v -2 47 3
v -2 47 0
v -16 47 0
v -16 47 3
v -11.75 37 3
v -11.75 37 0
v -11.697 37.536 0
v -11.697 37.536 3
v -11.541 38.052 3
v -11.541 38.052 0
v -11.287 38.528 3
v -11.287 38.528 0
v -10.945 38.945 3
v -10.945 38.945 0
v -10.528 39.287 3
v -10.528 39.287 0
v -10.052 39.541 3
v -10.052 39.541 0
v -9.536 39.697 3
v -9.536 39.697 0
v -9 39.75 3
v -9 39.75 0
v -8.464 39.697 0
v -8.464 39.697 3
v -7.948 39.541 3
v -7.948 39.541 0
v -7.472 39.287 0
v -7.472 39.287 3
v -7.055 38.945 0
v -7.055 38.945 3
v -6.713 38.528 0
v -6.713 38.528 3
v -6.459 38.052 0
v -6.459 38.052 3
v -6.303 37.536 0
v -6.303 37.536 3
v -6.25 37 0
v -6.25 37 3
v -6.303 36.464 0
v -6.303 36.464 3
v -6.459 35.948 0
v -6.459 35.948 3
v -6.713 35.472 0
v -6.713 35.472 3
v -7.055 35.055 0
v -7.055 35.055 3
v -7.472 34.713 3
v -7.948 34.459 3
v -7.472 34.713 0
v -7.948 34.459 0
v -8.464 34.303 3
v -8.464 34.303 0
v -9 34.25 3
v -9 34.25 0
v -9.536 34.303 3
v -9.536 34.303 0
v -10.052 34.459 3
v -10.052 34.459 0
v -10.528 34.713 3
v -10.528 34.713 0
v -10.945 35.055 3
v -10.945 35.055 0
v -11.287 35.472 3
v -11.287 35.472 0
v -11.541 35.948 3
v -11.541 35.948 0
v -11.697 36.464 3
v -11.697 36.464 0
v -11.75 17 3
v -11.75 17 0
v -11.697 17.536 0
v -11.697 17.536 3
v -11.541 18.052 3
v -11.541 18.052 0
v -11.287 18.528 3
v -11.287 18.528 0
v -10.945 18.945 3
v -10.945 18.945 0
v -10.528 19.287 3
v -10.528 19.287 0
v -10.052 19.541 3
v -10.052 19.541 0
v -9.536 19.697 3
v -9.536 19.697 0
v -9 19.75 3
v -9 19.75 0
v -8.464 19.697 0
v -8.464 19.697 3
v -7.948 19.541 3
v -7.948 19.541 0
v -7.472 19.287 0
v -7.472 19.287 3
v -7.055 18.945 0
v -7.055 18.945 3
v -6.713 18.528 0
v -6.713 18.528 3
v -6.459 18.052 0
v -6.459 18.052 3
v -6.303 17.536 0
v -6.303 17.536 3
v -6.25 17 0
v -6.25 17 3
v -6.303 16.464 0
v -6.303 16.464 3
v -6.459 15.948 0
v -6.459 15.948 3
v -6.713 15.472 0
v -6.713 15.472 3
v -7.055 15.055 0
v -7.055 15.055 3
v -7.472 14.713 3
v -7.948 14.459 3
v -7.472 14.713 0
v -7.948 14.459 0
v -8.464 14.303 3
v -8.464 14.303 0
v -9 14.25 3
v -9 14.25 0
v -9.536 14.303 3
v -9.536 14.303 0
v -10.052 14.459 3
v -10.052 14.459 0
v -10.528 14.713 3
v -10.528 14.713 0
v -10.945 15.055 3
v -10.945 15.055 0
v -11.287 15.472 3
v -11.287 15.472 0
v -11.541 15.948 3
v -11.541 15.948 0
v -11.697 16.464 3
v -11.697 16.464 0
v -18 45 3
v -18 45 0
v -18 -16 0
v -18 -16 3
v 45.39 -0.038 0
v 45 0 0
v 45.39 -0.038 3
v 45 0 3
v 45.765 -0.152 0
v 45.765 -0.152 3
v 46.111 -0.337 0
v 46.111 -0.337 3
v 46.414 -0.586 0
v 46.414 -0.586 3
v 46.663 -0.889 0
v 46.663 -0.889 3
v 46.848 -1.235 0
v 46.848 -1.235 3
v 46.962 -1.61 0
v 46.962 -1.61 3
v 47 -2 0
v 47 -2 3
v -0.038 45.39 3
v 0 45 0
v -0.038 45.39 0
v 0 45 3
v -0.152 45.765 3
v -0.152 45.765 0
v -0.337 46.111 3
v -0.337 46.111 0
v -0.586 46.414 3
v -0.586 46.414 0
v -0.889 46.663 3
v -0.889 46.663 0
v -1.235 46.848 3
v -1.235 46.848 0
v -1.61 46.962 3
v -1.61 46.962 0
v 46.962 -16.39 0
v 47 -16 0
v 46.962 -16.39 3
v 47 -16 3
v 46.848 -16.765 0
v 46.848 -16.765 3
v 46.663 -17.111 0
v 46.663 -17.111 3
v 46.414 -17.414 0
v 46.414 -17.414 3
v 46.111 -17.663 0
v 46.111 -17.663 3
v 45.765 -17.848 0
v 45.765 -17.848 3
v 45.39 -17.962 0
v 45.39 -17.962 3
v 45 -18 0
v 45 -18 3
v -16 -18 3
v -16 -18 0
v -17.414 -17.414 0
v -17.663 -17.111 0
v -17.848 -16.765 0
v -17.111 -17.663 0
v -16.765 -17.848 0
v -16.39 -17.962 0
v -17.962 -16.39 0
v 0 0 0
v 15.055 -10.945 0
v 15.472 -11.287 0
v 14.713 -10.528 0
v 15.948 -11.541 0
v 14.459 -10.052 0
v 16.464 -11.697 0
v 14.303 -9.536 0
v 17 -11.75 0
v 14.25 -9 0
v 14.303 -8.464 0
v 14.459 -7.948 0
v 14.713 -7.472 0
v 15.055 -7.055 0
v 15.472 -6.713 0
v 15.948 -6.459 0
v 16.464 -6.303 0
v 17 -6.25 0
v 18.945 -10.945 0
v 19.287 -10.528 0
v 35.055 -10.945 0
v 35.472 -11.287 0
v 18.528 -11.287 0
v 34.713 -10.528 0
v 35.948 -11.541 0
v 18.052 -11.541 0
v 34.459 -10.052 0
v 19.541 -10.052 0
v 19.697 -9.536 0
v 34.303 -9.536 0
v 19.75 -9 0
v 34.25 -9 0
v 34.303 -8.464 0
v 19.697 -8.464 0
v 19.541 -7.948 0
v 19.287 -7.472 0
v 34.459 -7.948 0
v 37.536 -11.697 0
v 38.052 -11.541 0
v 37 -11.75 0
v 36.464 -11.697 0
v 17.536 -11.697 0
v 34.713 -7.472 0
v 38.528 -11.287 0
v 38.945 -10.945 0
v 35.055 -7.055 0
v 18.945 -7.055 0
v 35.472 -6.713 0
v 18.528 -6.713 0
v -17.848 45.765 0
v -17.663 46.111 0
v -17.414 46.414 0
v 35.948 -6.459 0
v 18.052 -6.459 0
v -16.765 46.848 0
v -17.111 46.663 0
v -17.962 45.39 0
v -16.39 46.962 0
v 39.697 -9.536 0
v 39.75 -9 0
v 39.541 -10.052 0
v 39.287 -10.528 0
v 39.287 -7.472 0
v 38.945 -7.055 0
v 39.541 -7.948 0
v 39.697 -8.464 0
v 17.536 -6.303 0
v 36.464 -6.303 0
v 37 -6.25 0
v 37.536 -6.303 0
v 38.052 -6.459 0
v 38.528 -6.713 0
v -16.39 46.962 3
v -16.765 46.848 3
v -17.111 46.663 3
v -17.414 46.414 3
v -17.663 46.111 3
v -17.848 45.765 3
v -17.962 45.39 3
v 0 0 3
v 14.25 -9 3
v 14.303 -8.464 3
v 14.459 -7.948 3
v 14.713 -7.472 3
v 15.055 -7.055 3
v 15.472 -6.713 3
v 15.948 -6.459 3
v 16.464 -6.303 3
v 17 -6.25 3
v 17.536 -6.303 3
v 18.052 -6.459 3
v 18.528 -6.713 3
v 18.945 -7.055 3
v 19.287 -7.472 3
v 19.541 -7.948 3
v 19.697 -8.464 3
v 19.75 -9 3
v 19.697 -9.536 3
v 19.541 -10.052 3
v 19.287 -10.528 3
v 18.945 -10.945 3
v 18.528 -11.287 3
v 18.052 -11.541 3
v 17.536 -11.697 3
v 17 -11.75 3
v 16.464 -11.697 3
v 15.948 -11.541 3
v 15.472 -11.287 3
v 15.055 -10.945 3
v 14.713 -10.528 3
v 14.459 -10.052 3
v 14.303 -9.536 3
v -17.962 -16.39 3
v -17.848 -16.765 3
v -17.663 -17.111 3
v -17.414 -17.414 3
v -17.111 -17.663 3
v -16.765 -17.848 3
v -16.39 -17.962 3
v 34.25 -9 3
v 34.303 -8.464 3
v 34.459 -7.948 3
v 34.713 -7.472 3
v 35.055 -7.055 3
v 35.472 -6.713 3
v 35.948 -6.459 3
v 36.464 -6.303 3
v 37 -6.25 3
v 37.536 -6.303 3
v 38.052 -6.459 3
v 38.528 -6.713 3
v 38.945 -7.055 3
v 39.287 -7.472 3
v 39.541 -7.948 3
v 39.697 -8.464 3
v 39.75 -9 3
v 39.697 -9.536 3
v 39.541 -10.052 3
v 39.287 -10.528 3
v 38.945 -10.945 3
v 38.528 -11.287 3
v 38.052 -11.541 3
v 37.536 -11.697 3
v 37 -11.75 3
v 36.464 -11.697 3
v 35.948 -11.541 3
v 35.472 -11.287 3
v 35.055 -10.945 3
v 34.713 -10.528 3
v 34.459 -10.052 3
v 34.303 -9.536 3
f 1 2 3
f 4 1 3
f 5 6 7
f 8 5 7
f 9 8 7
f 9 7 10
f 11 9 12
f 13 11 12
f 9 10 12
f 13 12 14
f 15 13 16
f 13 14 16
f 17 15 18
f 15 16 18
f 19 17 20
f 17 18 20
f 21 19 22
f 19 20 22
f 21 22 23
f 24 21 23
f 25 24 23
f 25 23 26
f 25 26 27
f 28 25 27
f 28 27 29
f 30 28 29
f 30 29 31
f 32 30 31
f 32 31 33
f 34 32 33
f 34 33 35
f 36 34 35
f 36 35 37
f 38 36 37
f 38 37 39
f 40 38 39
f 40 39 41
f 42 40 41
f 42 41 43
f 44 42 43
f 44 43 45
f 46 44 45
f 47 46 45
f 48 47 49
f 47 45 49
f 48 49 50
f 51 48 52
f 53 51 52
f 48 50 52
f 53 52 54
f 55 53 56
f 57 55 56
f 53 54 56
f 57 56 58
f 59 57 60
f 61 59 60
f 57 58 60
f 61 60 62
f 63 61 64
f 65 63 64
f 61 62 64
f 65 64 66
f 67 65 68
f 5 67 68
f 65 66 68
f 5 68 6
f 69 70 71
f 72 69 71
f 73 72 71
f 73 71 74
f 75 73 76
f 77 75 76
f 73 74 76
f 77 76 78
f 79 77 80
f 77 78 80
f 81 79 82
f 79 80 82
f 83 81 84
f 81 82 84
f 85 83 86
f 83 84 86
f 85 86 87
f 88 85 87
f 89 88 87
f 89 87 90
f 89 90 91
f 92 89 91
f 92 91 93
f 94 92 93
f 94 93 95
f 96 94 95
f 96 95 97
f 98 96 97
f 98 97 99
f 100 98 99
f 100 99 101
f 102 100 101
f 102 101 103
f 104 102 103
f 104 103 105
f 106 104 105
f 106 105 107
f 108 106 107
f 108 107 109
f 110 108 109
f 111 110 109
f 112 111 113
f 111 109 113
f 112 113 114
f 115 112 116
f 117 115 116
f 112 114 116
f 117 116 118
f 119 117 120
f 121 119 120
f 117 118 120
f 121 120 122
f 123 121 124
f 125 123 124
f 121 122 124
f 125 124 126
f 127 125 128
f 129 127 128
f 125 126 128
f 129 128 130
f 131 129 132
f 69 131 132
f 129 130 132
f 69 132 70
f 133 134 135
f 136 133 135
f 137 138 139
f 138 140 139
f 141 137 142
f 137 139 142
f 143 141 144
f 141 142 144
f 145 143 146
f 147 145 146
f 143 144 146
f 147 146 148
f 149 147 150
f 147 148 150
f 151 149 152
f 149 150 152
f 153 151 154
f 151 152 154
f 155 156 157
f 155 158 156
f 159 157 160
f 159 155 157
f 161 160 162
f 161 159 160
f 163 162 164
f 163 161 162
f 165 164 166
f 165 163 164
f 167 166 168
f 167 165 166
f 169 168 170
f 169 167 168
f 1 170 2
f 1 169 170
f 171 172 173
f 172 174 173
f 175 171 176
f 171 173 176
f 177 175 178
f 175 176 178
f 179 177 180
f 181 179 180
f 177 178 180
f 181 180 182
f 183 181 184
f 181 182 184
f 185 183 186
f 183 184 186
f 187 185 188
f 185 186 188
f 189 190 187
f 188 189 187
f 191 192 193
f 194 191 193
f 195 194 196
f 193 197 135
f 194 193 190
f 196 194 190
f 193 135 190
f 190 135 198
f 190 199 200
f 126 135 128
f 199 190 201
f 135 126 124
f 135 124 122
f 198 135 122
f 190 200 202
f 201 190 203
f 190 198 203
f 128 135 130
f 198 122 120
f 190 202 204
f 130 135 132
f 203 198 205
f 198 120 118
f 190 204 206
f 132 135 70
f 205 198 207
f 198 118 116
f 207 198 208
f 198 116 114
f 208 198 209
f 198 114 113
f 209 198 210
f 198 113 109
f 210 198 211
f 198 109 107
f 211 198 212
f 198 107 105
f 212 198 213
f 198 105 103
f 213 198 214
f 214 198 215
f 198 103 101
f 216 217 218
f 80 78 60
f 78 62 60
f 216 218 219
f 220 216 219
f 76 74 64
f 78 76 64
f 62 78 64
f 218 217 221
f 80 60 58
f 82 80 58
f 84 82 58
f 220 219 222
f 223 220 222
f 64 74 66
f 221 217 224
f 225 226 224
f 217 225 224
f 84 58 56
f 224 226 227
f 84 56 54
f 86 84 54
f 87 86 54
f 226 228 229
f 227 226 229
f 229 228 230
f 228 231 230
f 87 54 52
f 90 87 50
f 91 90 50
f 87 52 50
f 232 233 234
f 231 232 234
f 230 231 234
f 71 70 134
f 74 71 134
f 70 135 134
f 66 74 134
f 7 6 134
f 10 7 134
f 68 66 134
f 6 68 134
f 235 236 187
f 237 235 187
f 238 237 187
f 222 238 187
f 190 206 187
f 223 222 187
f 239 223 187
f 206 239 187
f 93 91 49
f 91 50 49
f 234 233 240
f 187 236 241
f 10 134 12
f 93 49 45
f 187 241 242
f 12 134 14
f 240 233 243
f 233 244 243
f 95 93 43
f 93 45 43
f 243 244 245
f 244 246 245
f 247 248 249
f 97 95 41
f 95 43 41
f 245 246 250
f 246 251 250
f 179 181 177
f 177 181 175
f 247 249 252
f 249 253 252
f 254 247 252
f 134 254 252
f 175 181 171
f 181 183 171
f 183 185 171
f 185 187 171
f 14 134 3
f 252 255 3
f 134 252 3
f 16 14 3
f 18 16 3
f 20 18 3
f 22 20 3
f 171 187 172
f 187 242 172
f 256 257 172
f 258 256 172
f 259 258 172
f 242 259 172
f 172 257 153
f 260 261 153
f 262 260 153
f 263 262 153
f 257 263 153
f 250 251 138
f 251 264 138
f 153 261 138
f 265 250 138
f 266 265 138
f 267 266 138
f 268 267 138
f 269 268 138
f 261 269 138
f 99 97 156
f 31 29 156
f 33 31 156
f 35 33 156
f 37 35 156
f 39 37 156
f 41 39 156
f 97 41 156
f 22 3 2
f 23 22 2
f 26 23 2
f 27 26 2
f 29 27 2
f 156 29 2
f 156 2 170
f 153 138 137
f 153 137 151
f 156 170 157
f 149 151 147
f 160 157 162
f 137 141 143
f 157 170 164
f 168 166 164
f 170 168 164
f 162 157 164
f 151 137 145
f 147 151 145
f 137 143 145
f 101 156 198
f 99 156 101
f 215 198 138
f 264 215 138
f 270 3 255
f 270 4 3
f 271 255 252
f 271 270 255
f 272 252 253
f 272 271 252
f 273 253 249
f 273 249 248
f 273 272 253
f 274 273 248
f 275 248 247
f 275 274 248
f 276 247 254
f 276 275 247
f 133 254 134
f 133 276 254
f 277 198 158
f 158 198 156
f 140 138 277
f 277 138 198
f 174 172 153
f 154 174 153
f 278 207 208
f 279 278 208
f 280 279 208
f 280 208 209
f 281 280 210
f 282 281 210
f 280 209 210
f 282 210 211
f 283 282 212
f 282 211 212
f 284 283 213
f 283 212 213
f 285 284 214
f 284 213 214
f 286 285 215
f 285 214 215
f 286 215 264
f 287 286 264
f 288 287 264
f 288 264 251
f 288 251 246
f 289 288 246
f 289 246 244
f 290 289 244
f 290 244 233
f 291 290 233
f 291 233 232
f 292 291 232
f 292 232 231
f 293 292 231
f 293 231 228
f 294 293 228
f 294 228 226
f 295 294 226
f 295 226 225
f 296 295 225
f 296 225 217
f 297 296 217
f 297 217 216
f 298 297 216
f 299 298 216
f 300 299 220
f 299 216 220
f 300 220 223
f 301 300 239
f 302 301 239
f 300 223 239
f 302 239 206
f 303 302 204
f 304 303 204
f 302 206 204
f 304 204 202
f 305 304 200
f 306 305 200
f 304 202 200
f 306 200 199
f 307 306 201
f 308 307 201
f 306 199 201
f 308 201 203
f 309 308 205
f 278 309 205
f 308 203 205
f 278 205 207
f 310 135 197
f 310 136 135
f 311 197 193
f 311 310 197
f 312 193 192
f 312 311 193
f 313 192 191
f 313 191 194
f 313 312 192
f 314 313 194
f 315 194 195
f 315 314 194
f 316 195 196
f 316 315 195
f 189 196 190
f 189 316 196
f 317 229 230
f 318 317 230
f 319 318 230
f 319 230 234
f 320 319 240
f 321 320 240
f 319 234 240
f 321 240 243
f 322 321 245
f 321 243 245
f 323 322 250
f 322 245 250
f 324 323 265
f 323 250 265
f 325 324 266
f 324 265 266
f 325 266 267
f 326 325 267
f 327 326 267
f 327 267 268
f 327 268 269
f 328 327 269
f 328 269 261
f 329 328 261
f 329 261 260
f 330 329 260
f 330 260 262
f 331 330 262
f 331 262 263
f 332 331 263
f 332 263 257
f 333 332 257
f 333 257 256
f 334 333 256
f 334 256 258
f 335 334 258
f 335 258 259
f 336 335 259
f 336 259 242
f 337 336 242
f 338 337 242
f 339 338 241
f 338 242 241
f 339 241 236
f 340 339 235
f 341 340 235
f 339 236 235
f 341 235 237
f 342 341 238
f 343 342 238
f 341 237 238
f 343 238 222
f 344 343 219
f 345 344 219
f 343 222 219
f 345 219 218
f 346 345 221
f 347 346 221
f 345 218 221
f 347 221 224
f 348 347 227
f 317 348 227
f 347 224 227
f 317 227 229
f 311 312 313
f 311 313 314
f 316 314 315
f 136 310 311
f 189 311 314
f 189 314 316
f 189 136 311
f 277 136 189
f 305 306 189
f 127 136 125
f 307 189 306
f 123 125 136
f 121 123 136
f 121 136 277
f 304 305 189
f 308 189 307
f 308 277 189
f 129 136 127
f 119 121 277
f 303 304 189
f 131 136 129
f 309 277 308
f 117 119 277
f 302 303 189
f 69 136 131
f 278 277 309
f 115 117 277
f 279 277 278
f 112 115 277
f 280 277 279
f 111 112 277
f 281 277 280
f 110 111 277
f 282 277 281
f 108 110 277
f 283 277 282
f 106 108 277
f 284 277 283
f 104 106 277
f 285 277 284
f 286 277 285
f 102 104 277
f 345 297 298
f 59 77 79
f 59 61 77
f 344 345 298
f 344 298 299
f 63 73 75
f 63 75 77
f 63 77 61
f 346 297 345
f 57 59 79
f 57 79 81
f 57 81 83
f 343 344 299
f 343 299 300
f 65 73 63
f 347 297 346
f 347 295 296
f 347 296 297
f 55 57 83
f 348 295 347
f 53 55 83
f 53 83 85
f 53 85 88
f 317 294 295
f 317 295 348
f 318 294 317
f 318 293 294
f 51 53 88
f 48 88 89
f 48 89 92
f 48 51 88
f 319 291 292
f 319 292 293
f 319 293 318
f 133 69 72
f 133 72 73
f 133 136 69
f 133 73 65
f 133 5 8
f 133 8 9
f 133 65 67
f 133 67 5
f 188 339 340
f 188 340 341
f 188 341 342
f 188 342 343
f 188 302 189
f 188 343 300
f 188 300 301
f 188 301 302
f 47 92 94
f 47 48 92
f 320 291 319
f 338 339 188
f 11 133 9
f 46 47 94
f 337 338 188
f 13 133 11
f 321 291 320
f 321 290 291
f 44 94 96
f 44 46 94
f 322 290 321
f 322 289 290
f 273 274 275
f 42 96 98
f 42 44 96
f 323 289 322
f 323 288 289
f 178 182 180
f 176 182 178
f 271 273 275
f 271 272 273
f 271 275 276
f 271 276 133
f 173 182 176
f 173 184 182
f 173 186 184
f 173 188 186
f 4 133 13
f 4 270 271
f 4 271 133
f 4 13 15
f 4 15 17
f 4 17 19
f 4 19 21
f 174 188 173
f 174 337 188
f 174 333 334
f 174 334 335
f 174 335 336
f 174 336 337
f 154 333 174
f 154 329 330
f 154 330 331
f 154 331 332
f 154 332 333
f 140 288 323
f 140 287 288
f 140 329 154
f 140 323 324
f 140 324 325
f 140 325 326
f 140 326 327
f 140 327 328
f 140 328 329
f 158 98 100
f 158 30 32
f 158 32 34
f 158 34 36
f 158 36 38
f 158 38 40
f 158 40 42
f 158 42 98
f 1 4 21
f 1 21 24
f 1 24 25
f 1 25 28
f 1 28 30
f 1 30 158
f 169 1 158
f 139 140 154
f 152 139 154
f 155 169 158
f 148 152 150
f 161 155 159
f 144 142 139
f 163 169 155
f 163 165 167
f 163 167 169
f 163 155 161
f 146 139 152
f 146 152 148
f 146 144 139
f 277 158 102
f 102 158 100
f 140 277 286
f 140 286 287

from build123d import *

# Parameters (mm, degrees)
AUFSATZ_LINEAR_AUSTRAGEN1_DEPTH = 3
DURCHGANGSLOCH_F_R_M51_D        = 5.5
VERRUNDUNG1_R                   = 2


with BuildPart() as part:
    # Skizze1 → Aufsatz-Linear austragen1 (new body)
    with BuildSketch(Plane.XY):
        Polygon((0, 0), (0, 47), (-18, 47), (-18, -18), (47, -18), (47, 0), align=None)
    extrude(amount=AUFSATZ_LINEAR_AUSTRAGEN1_DEPTH)

    # Durchgangsloch für M51 (through all)
    with Locations(Plane.XY.offset(3)):
        with Locations((17, -9), (-9, 37), (-9, 17), (37, -9)):
            Hole(DURCHGANGSLOCH_F_R_M51_D / 2)

    # Verrundung1
    verrundung1_edges = [part.edges().sort_by_distance(p)[0] for p in [
        (47, 0, 1.5),
        (47, -18, 1.5),
        (-18, -18, 1.5),
        (-18, 47, 1.5),
        (0, 47, 1.5),
    ]]
    fillet(verrundung1_edges, radius=VERRUNDUNG1_R)


solid = part.part
